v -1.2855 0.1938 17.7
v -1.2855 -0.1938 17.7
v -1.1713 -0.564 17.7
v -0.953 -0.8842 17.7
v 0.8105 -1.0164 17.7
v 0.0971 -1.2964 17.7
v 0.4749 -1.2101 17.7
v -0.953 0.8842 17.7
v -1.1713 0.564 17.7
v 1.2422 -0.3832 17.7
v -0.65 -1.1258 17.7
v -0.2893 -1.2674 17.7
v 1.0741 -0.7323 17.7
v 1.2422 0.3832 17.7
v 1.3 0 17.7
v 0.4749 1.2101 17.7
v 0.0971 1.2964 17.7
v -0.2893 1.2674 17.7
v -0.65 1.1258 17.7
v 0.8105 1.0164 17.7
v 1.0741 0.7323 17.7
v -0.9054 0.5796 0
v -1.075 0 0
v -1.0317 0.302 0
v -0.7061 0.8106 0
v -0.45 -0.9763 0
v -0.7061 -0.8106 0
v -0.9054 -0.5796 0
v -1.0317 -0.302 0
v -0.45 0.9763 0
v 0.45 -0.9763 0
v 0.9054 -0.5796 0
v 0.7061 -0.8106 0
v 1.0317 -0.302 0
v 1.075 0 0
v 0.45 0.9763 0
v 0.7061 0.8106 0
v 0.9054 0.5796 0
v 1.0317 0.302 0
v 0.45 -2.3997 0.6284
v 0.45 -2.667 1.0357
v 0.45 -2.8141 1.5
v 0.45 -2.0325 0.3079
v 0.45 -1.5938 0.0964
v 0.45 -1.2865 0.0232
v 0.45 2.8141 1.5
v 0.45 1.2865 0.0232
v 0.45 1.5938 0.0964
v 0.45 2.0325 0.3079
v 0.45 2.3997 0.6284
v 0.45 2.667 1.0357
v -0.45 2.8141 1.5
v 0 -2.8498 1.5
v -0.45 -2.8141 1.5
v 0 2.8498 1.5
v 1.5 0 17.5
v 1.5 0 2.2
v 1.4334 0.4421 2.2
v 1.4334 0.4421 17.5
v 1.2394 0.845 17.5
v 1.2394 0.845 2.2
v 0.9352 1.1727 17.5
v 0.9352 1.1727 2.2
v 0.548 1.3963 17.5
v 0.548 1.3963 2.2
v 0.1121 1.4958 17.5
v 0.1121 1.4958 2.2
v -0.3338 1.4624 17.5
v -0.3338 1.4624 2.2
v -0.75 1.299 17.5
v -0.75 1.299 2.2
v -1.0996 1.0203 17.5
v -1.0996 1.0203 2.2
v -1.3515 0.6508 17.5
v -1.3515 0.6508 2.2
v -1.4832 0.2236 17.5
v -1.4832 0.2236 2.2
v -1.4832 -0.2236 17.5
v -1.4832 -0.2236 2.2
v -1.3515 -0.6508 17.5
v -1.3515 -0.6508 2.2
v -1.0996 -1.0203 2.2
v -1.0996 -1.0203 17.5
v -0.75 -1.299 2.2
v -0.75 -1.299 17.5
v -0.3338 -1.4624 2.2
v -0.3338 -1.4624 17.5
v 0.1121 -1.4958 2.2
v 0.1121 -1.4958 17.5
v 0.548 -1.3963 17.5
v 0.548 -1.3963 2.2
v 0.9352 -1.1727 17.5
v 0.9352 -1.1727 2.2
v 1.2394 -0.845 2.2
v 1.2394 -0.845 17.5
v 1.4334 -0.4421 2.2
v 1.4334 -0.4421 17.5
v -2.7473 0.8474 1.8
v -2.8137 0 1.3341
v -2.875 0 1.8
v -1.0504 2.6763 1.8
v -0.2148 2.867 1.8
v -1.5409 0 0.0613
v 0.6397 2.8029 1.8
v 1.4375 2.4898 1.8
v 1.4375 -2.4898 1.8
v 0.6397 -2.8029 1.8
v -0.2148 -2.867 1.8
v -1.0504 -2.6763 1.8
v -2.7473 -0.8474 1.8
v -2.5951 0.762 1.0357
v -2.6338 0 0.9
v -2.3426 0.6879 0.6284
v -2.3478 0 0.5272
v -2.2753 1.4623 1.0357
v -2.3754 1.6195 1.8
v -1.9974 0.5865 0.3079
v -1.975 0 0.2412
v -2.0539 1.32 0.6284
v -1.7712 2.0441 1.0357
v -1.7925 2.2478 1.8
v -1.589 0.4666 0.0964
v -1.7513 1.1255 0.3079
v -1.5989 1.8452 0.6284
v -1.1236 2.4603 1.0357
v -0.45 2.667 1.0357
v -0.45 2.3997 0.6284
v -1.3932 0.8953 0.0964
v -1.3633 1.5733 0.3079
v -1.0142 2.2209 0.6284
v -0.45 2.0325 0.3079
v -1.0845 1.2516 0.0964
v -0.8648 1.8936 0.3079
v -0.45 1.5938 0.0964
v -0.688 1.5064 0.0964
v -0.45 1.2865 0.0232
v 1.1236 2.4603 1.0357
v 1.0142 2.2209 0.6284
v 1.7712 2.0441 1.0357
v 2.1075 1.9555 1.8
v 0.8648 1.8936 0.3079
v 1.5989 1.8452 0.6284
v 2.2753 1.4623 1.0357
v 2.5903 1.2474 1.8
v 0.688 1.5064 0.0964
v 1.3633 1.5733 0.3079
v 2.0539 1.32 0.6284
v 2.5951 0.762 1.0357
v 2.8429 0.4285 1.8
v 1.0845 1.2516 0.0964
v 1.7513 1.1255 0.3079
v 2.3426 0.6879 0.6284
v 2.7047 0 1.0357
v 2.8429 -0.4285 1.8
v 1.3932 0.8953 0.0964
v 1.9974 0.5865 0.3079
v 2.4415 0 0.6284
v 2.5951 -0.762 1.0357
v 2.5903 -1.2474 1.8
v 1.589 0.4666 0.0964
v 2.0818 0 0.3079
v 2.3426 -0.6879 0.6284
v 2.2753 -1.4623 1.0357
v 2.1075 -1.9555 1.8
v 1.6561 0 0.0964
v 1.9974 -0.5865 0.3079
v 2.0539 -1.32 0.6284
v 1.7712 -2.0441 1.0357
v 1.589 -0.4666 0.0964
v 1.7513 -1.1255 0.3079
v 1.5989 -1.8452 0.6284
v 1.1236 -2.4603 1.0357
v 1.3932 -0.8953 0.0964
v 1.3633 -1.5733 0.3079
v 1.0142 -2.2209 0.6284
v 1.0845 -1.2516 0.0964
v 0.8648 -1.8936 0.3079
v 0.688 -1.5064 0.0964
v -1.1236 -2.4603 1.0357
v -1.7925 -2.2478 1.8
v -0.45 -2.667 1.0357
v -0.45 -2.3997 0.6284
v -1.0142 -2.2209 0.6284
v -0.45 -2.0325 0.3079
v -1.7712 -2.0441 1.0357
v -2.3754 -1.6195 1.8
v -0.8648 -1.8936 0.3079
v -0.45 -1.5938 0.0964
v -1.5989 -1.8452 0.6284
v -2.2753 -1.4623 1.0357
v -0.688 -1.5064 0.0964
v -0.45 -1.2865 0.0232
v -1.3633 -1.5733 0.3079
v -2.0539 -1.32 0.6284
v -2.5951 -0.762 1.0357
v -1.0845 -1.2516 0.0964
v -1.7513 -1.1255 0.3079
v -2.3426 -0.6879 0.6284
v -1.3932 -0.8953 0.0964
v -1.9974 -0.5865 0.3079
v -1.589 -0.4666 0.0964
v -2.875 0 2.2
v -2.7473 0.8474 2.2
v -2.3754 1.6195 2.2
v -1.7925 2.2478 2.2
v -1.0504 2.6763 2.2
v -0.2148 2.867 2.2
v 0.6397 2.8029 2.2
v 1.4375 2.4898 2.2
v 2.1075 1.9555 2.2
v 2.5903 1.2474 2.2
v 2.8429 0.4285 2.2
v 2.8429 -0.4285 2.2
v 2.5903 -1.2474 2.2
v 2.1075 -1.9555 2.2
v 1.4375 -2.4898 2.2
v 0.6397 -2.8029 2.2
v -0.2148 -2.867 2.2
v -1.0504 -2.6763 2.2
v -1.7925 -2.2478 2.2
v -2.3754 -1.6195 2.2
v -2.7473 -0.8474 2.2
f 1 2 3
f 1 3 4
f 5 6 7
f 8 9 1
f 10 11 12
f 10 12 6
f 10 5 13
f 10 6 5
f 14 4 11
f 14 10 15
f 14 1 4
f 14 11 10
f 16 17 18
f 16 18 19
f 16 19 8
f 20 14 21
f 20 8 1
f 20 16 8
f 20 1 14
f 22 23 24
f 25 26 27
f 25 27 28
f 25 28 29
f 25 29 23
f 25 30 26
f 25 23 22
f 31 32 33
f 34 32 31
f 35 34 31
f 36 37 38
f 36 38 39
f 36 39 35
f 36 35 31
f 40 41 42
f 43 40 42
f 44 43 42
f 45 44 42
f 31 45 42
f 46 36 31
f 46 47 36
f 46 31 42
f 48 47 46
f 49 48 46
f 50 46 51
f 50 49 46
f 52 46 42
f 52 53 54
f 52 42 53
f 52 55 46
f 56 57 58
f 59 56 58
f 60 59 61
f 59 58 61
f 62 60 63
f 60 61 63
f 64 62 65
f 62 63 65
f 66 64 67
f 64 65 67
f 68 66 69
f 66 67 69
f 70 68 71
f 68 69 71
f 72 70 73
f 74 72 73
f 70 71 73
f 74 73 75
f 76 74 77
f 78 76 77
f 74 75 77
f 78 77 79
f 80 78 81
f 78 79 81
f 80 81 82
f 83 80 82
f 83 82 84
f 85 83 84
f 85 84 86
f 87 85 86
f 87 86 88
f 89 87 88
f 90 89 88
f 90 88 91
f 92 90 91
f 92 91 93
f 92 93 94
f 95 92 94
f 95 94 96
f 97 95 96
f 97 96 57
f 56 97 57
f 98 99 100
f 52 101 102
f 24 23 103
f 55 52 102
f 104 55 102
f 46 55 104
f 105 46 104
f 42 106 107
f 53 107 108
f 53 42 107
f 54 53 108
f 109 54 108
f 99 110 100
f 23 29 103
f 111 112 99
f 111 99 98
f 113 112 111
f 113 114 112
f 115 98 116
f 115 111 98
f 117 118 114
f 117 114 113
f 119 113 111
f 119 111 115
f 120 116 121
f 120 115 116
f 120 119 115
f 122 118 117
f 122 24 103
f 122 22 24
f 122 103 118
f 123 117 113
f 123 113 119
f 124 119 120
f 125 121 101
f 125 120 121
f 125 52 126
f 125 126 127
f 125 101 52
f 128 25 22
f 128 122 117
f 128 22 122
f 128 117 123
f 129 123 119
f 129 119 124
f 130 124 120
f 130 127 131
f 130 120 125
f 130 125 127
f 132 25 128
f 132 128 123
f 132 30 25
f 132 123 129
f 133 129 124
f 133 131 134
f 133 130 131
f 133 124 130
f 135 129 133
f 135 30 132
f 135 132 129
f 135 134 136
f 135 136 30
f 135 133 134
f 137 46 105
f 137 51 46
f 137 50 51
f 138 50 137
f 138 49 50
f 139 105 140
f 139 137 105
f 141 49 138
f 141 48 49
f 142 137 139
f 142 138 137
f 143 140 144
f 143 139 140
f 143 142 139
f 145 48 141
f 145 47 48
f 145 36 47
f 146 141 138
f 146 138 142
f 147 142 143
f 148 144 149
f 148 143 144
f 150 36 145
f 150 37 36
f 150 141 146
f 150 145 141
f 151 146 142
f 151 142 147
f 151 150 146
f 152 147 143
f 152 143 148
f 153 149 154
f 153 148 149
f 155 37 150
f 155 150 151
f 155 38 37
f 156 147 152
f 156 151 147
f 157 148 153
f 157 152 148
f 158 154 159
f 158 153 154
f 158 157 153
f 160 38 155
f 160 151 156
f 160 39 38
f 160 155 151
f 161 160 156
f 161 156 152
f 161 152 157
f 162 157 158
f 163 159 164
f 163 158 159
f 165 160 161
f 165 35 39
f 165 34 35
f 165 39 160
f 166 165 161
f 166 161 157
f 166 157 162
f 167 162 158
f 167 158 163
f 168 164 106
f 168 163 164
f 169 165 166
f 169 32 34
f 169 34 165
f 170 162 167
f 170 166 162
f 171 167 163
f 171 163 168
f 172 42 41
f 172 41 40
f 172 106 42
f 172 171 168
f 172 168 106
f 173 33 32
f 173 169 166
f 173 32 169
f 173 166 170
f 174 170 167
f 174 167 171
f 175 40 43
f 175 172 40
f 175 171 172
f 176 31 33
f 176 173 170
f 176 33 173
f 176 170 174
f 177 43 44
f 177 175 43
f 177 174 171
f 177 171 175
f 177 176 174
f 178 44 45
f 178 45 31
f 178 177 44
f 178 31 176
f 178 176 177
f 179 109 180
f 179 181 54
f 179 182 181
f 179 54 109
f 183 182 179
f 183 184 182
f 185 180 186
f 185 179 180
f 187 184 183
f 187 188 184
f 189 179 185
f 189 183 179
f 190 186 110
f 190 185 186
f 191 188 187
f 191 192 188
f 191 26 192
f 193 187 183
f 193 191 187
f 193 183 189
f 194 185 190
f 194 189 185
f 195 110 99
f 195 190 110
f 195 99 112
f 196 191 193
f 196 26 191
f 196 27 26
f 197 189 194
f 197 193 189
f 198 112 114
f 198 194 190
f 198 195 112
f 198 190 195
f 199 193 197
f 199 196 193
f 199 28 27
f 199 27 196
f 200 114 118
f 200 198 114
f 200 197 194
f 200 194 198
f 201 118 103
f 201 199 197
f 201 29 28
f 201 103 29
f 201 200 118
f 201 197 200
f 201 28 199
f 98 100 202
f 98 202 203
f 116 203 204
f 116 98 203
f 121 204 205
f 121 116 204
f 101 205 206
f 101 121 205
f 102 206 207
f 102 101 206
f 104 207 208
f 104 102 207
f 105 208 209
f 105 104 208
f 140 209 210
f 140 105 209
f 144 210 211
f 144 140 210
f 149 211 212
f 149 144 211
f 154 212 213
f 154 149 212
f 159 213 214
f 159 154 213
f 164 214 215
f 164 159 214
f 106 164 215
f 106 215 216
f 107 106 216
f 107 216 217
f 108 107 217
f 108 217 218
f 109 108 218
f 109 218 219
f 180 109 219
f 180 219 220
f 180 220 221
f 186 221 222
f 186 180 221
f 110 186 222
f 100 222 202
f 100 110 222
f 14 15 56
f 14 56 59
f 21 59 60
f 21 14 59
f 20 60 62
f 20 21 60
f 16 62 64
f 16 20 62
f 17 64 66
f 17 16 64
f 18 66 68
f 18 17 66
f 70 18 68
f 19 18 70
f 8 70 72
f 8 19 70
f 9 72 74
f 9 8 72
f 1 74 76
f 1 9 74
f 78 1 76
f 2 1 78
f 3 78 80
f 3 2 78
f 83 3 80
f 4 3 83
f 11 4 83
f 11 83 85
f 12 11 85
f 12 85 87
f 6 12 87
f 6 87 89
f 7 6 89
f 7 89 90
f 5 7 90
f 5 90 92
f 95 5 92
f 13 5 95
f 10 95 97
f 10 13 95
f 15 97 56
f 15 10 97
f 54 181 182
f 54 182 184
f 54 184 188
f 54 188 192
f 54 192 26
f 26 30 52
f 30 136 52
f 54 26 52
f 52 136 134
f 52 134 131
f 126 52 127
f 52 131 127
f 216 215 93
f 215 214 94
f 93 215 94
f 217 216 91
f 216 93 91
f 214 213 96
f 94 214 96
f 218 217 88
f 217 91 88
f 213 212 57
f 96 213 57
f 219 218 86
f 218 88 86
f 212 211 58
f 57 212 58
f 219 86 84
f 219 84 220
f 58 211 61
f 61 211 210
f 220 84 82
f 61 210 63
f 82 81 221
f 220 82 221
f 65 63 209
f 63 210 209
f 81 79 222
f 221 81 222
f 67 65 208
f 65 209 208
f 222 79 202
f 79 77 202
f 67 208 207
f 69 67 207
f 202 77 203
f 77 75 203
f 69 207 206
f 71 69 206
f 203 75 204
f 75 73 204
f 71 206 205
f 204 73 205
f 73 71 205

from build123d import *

# Parameters (mm, degrees)
ESBO_O1_R                = 1.5
RESSALTO_EXTRUS_O1_DEPTH = 17.7
ESBO_O2_R                = 2.875
RESSALTO_EXTRUS_O2_DEPTH = 2.2
FILETE1_R                = 1.8
ESBO_O3_W                = 0.9
ESBO_O3_H                = 6.121542056
CORTE_EXTRUS_O1_DEPTH    = 1.5
CHANFRO1_SIZE            = 0.2


with BuildPart() as part:
    # Esboço1 → Ressalto-extrusão1 (new body)
    with BuildSketch(Plane.XY):
        Circle(ESBO_O1_R)
    extrude(amount=RESSALTO_EXTRUS_O1_DEPTH)

    # Esboço2 → Ressalto-extrusão2 (add)
    with BuildSketch(Plane(origin=(0, 0, 0), x_dir=(-1, 0, 0), z_dir=(0, 0, -1))):
        Circle(ESBO_O2_R)
    extrude(amount=-RESSALTO_EXTRUS_O2_DEPTH)

    # Filete1
    filete1_edges = [part.edges().sort_by_distance(p)[0] for p in [
        (2.875, 0, 0),
    ]]
    fillet(filete1_edges, radius=FILETE1_R)

    # Esboço3 → Corte-extrusão1 (cut)
    with BuildSketch(Plane(origin=(0, 0, 0), x_dir=(-1, 0, 0), z_dir=(0, 0, -1))):
        Rectangle(ESBO_O3_W, ESBO_O3_H)
    extrude(amount=-CORTE_EXTRUS_O1_DEPTH, mode=Mode.SUBTRACT)

    # Chanfro1
    chanfro1_edges = [part.edges().sort_by_distance(p)[0] for p in [
        (-1.5, 0, 17.7),
    ]]
    chamfer(chanfro1_edges, length=CHANFRO1_SIZE)


solid = part.part
